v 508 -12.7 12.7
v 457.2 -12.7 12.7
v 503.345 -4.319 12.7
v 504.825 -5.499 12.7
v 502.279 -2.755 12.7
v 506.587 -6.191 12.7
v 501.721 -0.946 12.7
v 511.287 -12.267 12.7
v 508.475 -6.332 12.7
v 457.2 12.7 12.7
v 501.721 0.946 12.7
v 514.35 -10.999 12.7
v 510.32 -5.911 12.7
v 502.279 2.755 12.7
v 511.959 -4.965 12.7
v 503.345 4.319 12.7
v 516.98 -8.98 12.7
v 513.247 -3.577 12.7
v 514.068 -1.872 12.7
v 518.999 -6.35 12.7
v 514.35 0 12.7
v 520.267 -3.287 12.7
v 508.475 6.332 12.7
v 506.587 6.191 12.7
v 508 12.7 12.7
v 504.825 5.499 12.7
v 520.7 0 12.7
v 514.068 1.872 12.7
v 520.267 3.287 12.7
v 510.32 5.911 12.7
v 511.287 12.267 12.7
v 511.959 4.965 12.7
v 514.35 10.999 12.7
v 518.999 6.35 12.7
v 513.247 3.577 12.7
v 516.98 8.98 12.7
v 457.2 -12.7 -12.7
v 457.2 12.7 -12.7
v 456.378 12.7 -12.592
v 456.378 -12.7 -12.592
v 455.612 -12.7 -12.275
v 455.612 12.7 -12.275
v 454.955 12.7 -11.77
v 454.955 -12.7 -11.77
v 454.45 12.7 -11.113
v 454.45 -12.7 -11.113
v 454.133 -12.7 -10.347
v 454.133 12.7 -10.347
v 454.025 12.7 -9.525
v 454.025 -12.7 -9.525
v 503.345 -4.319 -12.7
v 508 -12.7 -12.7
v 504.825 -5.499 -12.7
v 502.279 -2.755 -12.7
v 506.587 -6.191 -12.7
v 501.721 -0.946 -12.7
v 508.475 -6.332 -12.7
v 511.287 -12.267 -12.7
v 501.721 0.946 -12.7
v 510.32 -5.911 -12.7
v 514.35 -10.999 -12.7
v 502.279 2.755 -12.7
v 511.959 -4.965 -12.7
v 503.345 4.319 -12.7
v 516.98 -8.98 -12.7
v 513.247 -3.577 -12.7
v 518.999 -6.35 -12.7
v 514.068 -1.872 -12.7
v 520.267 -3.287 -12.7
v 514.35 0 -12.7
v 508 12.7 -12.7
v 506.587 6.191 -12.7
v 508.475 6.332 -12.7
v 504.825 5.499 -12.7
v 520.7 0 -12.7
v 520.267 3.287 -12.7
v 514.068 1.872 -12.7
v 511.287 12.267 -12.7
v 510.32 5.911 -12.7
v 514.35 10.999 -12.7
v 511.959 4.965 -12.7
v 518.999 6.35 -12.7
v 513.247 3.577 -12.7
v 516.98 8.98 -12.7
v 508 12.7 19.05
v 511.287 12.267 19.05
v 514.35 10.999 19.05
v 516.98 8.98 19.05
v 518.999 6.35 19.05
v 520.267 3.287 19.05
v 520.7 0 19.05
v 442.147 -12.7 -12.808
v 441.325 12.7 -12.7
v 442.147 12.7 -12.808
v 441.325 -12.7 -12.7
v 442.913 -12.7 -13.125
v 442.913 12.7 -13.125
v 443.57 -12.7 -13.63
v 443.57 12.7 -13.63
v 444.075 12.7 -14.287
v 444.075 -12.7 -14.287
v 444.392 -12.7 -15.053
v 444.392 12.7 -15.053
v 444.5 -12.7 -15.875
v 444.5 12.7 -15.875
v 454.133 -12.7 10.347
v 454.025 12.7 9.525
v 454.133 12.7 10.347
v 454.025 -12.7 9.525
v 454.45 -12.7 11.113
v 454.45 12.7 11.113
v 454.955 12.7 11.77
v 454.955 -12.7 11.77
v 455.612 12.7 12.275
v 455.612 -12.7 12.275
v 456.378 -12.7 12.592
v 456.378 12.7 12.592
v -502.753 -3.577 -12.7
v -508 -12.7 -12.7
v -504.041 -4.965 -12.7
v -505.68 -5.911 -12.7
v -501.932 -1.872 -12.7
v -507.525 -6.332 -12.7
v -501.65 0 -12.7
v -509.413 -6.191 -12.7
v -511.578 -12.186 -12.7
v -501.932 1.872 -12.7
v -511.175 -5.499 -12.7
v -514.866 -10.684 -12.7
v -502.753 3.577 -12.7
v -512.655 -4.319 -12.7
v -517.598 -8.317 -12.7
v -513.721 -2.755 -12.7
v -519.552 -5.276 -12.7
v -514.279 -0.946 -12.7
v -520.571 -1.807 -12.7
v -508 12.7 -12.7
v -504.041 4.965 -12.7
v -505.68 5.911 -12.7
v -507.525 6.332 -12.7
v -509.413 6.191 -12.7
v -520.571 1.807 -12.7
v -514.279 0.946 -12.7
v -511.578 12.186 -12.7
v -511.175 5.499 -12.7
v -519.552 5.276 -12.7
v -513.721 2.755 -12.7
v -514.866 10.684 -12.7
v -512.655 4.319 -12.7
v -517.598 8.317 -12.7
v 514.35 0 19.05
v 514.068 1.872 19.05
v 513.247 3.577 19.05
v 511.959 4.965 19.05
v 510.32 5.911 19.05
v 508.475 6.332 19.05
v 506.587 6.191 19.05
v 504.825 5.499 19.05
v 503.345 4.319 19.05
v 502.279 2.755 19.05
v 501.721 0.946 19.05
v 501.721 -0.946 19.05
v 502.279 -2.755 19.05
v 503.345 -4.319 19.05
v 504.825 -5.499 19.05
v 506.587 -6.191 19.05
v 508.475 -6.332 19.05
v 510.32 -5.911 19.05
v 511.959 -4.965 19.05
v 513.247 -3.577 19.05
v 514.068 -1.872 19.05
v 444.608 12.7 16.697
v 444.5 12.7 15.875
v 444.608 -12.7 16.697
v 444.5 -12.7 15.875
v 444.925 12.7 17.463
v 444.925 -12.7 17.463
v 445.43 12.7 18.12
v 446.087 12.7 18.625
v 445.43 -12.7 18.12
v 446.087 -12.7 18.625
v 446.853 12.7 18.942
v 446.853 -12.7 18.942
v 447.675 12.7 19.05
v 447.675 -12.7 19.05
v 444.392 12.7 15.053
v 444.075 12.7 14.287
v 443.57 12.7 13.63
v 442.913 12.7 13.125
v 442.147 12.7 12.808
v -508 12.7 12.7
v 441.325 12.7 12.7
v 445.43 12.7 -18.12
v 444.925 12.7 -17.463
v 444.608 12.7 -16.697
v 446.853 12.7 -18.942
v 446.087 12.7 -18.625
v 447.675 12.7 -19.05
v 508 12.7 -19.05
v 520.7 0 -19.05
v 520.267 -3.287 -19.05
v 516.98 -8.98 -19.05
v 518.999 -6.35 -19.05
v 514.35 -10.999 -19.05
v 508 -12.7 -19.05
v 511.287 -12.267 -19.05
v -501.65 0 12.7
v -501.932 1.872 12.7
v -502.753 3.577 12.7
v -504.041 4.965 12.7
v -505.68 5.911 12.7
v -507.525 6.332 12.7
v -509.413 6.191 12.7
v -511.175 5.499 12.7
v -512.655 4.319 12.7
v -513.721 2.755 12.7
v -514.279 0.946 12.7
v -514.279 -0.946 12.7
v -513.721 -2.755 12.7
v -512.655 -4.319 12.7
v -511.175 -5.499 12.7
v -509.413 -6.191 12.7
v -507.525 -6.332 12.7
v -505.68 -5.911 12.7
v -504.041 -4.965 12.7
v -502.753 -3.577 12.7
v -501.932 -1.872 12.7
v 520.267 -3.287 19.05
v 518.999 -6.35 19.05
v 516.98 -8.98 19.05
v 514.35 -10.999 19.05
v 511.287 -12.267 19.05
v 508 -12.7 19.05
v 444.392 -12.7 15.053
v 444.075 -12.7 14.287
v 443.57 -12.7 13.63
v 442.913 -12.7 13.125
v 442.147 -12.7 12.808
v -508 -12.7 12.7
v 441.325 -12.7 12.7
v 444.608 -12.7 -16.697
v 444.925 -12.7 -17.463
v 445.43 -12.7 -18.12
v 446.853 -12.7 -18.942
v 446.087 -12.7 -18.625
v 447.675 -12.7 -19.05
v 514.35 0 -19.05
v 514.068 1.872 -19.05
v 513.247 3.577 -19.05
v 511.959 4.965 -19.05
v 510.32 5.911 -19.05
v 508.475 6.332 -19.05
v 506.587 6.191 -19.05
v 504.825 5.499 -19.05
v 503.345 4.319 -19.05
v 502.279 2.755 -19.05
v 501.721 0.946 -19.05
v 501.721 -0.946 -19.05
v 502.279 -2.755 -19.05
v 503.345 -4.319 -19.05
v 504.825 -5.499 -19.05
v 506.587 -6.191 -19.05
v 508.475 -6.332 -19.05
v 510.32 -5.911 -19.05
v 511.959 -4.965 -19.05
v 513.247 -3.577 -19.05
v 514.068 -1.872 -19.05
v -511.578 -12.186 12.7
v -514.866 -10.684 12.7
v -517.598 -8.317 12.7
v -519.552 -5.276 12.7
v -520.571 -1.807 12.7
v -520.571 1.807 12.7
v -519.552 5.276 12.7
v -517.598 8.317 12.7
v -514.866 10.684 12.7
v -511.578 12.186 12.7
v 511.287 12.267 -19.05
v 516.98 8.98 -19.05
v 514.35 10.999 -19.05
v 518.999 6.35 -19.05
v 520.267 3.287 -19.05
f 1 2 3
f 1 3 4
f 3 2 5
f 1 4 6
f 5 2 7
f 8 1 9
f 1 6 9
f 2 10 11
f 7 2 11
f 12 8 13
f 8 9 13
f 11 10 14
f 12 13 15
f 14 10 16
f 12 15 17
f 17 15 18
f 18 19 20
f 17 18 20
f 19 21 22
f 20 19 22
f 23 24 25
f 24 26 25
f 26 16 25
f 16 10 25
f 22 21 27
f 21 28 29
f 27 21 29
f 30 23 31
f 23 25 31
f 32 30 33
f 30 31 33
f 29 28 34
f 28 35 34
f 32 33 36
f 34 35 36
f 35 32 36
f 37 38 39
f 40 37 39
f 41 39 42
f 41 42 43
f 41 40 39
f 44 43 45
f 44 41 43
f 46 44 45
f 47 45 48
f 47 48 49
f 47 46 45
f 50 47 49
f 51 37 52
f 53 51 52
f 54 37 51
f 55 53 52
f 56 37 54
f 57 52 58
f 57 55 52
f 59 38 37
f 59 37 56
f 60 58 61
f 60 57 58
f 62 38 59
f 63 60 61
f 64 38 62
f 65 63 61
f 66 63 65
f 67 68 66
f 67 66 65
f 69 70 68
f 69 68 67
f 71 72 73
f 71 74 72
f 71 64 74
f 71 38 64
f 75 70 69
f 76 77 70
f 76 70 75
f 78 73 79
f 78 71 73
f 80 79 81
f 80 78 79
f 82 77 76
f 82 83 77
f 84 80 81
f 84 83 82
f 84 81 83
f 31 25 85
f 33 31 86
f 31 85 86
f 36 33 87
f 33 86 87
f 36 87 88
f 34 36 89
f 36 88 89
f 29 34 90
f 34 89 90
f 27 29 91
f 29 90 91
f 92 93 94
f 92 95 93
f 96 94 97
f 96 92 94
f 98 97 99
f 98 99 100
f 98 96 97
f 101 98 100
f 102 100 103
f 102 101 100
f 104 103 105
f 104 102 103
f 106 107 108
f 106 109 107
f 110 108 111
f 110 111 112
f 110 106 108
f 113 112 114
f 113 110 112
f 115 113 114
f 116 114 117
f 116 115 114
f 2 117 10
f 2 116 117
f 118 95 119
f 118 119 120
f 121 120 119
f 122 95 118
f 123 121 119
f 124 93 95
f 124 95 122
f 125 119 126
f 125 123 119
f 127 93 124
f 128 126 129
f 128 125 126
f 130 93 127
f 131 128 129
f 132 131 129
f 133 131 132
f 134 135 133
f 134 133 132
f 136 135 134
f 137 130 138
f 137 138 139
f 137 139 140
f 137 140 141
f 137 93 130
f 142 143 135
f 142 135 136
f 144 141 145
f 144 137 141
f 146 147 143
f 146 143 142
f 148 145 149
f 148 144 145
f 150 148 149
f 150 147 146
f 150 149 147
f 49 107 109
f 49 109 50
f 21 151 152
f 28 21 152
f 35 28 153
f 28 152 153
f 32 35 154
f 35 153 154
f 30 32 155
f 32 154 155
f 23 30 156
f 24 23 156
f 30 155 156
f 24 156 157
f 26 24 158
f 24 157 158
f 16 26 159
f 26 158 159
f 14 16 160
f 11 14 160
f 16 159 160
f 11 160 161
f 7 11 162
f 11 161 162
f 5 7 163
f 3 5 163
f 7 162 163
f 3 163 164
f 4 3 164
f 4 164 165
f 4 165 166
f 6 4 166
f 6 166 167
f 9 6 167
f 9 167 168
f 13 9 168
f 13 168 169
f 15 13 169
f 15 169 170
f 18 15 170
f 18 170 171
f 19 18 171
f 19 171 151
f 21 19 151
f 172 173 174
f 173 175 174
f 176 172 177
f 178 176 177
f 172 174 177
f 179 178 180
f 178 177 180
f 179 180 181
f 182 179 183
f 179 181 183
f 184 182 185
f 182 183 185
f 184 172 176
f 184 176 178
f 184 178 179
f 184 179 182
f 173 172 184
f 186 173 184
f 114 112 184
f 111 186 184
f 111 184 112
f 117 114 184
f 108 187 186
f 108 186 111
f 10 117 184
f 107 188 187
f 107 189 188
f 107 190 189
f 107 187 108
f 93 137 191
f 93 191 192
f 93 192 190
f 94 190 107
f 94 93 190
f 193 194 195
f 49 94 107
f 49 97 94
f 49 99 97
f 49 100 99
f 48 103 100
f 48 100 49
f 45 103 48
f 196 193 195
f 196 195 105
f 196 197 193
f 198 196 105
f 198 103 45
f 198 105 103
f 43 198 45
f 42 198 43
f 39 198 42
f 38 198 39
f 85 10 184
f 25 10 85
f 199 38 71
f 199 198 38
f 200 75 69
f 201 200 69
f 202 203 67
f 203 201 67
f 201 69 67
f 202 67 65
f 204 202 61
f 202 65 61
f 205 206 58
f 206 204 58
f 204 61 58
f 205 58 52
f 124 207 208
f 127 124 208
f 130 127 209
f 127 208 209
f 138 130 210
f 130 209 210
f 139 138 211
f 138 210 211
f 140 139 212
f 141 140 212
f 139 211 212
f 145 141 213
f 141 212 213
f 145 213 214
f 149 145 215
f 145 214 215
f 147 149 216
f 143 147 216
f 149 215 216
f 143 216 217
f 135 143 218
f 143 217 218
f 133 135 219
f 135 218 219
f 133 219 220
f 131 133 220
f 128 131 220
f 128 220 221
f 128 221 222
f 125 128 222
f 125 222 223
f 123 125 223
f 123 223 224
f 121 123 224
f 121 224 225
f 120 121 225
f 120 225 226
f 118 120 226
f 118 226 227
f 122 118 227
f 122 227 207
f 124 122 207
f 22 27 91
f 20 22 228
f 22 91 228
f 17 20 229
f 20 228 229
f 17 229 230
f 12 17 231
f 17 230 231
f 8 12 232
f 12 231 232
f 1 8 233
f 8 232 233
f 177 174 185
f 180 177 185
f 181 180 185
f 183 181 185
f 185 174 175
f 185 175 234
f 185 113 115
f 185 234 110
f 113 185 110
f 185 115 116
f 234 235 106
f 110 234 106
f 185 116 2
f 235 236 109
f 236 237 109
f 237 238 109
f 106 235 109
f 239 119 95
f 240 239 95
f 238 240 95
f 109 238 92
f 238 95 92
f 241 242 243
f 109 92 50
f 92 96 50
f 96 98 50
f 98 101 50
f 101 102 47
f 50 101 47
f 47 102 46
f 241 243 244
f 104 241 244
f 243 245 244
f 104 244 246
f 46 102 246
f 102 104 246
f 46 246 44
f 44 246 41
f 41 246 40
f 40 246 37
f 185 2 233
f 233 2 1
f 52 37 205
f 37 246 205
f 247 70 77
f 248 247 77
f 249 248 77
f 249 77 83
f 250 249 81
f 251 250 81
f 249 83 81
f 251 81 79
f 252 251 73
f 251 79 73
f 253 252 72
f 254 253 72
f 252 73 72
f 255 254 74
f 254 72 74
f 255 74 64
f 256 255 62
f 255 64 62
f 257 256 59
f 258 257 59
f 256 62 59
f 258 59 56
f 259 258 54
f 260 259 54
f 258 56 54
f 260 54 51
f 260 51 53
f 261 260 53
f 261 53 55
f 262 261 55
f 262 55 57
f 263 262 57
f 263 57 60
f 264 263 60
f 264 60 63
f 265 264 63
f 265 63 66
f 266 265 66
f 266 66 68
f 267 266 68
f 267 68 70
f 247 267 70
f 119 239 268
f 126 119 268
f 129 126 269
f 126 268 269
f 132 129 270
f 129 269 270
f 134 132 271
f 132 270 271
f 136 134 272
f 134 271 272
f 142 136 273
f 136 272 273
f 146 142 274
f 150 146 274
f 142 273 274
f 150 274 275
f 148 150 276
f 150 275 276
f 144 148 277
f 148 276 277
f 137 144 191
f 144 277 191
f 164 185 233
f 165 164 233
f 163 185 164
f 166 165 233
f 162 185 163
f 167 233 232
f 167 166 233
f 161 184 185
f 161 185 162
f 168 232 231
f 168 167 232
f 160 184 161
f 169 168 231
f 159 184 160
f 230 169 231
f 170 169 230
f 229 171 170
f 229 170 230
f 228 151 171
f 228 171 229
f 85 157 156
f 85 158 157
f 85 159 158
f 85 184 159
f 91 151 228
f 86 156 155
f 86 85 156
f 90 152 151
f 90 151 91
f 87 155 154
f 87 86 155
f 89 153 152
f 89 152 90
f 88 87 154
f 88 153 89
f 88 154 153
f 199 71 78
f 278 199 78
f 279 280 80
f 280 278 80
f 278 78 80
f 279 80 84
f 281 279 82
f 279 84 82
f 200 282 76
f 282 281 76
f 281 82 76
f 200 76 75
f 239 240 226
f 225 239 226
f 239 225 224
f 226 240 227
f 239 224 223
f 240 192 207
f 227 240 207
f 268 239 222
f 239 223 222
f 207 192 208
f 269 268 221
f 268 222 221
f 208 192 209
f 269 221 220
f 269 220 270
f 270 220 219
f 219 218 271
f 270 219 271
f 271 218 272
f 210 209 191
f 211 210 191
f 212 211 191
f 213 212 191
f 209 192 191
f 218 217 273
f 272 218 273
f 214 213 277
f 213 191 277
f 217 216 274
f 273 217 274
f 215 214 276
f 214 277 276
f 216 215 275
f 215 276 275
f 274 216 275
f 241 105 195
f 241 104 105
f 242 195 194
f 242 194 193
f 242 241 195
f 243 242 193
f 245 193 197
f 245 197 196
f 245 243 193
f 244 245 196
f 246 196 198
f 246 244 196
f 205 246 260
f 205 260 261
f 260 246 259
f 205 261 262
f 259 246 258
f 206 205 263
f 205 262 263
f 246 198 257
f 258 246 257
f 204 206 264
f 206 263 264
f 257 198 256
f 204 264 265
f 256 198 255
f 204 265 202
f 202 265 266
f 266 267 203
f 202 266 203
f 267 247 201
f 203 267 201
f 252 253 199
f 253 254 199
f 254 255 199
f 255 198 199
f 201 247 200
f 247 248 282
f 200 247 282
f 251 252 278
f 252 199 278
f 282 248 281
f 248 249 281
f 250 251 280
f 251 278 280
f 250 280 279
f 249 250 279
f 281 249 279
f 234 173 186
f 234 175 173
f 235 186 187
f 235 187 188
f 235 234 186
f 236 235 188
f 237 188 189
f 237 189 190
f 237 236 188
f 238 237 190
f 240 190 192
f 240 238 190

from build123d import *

# Parameters (mm, degrees)
BOSS_EXTRUDE1_DEPTH = 12.7
SKETCH2_R           = 6.35
CUT_EXTRUDE1_DEPTH  = 522.473815258
SKETCH3_W           = 76.2
SKETCH3_H           = 38.1
BOSS_EXTRUDE4_DEPTH = 25.4
SKETCH6_W           = 66.675
SKETCH6_H           = 25.4
CUT_EXTRUDE3_DEPTH  = 522.667089723
SKETCH4_R           = 6.35
CUT_EXTRUDE2_DEPTH  = 523.246483952
FILLET3_R           = 3.175


with BuildPart() as part:
    # Sketch1 → Boss-Extrude1 (new, symmetric)
    with BuildSketch(Plane.XY):
        with BuildLine():
            Line((-508, 12.7), (508, 12.7))
            ThreePointArc((508, 12.7), (520.7, 0), (508, -12.7))
            Line((508, -12.7), (-508, -12.7))
            ThreePointArc((-508, -12.7), (-520.7, 0), (-508, 12.7))
        make_face()
    extrude(amount=BOSS_EXTRUDE1_DEPTH, both=True)

    # Sketch2 → Cut-Extrude1 (cut, through all)
    with BuildSketch(Plane.XY.offset(12.7)):
        with Locations((-508, 0)):
            Circle(SKETCH2_R)
        with Locations((508, 0)):
            Circle(SKETCH2_R)
    extrude(amount=-CUT_EXTRUDE1_DEPTH, mode=Mode.SUBTRACT)

    # Sketch3 → Boss-Extrude4 (add, through all)
    with BuildSketch(Plane(origin=(0, 12.7, 0), x_dir=(1, 0, 0), z_dir=(0, 1, 0))):
        with Locations((482.6, 0)):
            Rectangle(SKETCH3_W, SKETCH3_H)
    extrude(amount=-BOSS_EXTRUDE4_DEPTH)

    # Sketch6 → Cut-Extrude3 (cut, through all)
    with BuildSketch(Plane(origin=(0, 12.7, 0), x_dir=(1, 0, 0), z_dir=(0, 1, 0))):
        with Locations((487.3625, 0)):
            Rectangle(SKETCH6_W, SKETCH6_H)
    extrude(amount=-CUT_EXTRUDE3_DEPTH, mode=Mode.SUBTRACT)

    # Sketch4 → Cut-Extrude2 (cut, through all)
    with BuildSketch(Plane.XY.offset(19.05)):
        with BuildLine():
            Line((520.7, 0), (520.7, 12.7))
            Line((520.7, 12.7), (508, 12.7))
            ThreePointArc((508, 12.7), (516.980256121, 8.980256121), (520.7, 0))
        make_face()
        with BuildLine():
            Line((520.7, -12.7), (520.7, 0))
            ThreePointArc((520.7, 0), (516.980256121, -8.980256121), (508, -12.7))
            Line((508, -12.7), (520.7, -12.7))
        make_face()
        with Locations((508, 0)):
            Circle(SKETCH4_R)
    extrude(amount=-CUT_EXTRUDE2_DEPTH, mode=Mode.SUBTRACT)

    # Fillet3
    fillet3_edges = [part.edges().sort_by_distance(p)[0] for p in [
        (454.025, 0, 12.7),
        (444.5, 0, -19.05),
        (444.5, 0, -12.7),
        (444.5, 0, 12.7),
        (454.025, 0, -12.7),
        (444.5, 0, 19.05),
    ]]
    fillet(fillet3_edges, radius=FILLET3_R - 0.0001)  # a hair under: the kernel refuses the full size


solid = part.part
